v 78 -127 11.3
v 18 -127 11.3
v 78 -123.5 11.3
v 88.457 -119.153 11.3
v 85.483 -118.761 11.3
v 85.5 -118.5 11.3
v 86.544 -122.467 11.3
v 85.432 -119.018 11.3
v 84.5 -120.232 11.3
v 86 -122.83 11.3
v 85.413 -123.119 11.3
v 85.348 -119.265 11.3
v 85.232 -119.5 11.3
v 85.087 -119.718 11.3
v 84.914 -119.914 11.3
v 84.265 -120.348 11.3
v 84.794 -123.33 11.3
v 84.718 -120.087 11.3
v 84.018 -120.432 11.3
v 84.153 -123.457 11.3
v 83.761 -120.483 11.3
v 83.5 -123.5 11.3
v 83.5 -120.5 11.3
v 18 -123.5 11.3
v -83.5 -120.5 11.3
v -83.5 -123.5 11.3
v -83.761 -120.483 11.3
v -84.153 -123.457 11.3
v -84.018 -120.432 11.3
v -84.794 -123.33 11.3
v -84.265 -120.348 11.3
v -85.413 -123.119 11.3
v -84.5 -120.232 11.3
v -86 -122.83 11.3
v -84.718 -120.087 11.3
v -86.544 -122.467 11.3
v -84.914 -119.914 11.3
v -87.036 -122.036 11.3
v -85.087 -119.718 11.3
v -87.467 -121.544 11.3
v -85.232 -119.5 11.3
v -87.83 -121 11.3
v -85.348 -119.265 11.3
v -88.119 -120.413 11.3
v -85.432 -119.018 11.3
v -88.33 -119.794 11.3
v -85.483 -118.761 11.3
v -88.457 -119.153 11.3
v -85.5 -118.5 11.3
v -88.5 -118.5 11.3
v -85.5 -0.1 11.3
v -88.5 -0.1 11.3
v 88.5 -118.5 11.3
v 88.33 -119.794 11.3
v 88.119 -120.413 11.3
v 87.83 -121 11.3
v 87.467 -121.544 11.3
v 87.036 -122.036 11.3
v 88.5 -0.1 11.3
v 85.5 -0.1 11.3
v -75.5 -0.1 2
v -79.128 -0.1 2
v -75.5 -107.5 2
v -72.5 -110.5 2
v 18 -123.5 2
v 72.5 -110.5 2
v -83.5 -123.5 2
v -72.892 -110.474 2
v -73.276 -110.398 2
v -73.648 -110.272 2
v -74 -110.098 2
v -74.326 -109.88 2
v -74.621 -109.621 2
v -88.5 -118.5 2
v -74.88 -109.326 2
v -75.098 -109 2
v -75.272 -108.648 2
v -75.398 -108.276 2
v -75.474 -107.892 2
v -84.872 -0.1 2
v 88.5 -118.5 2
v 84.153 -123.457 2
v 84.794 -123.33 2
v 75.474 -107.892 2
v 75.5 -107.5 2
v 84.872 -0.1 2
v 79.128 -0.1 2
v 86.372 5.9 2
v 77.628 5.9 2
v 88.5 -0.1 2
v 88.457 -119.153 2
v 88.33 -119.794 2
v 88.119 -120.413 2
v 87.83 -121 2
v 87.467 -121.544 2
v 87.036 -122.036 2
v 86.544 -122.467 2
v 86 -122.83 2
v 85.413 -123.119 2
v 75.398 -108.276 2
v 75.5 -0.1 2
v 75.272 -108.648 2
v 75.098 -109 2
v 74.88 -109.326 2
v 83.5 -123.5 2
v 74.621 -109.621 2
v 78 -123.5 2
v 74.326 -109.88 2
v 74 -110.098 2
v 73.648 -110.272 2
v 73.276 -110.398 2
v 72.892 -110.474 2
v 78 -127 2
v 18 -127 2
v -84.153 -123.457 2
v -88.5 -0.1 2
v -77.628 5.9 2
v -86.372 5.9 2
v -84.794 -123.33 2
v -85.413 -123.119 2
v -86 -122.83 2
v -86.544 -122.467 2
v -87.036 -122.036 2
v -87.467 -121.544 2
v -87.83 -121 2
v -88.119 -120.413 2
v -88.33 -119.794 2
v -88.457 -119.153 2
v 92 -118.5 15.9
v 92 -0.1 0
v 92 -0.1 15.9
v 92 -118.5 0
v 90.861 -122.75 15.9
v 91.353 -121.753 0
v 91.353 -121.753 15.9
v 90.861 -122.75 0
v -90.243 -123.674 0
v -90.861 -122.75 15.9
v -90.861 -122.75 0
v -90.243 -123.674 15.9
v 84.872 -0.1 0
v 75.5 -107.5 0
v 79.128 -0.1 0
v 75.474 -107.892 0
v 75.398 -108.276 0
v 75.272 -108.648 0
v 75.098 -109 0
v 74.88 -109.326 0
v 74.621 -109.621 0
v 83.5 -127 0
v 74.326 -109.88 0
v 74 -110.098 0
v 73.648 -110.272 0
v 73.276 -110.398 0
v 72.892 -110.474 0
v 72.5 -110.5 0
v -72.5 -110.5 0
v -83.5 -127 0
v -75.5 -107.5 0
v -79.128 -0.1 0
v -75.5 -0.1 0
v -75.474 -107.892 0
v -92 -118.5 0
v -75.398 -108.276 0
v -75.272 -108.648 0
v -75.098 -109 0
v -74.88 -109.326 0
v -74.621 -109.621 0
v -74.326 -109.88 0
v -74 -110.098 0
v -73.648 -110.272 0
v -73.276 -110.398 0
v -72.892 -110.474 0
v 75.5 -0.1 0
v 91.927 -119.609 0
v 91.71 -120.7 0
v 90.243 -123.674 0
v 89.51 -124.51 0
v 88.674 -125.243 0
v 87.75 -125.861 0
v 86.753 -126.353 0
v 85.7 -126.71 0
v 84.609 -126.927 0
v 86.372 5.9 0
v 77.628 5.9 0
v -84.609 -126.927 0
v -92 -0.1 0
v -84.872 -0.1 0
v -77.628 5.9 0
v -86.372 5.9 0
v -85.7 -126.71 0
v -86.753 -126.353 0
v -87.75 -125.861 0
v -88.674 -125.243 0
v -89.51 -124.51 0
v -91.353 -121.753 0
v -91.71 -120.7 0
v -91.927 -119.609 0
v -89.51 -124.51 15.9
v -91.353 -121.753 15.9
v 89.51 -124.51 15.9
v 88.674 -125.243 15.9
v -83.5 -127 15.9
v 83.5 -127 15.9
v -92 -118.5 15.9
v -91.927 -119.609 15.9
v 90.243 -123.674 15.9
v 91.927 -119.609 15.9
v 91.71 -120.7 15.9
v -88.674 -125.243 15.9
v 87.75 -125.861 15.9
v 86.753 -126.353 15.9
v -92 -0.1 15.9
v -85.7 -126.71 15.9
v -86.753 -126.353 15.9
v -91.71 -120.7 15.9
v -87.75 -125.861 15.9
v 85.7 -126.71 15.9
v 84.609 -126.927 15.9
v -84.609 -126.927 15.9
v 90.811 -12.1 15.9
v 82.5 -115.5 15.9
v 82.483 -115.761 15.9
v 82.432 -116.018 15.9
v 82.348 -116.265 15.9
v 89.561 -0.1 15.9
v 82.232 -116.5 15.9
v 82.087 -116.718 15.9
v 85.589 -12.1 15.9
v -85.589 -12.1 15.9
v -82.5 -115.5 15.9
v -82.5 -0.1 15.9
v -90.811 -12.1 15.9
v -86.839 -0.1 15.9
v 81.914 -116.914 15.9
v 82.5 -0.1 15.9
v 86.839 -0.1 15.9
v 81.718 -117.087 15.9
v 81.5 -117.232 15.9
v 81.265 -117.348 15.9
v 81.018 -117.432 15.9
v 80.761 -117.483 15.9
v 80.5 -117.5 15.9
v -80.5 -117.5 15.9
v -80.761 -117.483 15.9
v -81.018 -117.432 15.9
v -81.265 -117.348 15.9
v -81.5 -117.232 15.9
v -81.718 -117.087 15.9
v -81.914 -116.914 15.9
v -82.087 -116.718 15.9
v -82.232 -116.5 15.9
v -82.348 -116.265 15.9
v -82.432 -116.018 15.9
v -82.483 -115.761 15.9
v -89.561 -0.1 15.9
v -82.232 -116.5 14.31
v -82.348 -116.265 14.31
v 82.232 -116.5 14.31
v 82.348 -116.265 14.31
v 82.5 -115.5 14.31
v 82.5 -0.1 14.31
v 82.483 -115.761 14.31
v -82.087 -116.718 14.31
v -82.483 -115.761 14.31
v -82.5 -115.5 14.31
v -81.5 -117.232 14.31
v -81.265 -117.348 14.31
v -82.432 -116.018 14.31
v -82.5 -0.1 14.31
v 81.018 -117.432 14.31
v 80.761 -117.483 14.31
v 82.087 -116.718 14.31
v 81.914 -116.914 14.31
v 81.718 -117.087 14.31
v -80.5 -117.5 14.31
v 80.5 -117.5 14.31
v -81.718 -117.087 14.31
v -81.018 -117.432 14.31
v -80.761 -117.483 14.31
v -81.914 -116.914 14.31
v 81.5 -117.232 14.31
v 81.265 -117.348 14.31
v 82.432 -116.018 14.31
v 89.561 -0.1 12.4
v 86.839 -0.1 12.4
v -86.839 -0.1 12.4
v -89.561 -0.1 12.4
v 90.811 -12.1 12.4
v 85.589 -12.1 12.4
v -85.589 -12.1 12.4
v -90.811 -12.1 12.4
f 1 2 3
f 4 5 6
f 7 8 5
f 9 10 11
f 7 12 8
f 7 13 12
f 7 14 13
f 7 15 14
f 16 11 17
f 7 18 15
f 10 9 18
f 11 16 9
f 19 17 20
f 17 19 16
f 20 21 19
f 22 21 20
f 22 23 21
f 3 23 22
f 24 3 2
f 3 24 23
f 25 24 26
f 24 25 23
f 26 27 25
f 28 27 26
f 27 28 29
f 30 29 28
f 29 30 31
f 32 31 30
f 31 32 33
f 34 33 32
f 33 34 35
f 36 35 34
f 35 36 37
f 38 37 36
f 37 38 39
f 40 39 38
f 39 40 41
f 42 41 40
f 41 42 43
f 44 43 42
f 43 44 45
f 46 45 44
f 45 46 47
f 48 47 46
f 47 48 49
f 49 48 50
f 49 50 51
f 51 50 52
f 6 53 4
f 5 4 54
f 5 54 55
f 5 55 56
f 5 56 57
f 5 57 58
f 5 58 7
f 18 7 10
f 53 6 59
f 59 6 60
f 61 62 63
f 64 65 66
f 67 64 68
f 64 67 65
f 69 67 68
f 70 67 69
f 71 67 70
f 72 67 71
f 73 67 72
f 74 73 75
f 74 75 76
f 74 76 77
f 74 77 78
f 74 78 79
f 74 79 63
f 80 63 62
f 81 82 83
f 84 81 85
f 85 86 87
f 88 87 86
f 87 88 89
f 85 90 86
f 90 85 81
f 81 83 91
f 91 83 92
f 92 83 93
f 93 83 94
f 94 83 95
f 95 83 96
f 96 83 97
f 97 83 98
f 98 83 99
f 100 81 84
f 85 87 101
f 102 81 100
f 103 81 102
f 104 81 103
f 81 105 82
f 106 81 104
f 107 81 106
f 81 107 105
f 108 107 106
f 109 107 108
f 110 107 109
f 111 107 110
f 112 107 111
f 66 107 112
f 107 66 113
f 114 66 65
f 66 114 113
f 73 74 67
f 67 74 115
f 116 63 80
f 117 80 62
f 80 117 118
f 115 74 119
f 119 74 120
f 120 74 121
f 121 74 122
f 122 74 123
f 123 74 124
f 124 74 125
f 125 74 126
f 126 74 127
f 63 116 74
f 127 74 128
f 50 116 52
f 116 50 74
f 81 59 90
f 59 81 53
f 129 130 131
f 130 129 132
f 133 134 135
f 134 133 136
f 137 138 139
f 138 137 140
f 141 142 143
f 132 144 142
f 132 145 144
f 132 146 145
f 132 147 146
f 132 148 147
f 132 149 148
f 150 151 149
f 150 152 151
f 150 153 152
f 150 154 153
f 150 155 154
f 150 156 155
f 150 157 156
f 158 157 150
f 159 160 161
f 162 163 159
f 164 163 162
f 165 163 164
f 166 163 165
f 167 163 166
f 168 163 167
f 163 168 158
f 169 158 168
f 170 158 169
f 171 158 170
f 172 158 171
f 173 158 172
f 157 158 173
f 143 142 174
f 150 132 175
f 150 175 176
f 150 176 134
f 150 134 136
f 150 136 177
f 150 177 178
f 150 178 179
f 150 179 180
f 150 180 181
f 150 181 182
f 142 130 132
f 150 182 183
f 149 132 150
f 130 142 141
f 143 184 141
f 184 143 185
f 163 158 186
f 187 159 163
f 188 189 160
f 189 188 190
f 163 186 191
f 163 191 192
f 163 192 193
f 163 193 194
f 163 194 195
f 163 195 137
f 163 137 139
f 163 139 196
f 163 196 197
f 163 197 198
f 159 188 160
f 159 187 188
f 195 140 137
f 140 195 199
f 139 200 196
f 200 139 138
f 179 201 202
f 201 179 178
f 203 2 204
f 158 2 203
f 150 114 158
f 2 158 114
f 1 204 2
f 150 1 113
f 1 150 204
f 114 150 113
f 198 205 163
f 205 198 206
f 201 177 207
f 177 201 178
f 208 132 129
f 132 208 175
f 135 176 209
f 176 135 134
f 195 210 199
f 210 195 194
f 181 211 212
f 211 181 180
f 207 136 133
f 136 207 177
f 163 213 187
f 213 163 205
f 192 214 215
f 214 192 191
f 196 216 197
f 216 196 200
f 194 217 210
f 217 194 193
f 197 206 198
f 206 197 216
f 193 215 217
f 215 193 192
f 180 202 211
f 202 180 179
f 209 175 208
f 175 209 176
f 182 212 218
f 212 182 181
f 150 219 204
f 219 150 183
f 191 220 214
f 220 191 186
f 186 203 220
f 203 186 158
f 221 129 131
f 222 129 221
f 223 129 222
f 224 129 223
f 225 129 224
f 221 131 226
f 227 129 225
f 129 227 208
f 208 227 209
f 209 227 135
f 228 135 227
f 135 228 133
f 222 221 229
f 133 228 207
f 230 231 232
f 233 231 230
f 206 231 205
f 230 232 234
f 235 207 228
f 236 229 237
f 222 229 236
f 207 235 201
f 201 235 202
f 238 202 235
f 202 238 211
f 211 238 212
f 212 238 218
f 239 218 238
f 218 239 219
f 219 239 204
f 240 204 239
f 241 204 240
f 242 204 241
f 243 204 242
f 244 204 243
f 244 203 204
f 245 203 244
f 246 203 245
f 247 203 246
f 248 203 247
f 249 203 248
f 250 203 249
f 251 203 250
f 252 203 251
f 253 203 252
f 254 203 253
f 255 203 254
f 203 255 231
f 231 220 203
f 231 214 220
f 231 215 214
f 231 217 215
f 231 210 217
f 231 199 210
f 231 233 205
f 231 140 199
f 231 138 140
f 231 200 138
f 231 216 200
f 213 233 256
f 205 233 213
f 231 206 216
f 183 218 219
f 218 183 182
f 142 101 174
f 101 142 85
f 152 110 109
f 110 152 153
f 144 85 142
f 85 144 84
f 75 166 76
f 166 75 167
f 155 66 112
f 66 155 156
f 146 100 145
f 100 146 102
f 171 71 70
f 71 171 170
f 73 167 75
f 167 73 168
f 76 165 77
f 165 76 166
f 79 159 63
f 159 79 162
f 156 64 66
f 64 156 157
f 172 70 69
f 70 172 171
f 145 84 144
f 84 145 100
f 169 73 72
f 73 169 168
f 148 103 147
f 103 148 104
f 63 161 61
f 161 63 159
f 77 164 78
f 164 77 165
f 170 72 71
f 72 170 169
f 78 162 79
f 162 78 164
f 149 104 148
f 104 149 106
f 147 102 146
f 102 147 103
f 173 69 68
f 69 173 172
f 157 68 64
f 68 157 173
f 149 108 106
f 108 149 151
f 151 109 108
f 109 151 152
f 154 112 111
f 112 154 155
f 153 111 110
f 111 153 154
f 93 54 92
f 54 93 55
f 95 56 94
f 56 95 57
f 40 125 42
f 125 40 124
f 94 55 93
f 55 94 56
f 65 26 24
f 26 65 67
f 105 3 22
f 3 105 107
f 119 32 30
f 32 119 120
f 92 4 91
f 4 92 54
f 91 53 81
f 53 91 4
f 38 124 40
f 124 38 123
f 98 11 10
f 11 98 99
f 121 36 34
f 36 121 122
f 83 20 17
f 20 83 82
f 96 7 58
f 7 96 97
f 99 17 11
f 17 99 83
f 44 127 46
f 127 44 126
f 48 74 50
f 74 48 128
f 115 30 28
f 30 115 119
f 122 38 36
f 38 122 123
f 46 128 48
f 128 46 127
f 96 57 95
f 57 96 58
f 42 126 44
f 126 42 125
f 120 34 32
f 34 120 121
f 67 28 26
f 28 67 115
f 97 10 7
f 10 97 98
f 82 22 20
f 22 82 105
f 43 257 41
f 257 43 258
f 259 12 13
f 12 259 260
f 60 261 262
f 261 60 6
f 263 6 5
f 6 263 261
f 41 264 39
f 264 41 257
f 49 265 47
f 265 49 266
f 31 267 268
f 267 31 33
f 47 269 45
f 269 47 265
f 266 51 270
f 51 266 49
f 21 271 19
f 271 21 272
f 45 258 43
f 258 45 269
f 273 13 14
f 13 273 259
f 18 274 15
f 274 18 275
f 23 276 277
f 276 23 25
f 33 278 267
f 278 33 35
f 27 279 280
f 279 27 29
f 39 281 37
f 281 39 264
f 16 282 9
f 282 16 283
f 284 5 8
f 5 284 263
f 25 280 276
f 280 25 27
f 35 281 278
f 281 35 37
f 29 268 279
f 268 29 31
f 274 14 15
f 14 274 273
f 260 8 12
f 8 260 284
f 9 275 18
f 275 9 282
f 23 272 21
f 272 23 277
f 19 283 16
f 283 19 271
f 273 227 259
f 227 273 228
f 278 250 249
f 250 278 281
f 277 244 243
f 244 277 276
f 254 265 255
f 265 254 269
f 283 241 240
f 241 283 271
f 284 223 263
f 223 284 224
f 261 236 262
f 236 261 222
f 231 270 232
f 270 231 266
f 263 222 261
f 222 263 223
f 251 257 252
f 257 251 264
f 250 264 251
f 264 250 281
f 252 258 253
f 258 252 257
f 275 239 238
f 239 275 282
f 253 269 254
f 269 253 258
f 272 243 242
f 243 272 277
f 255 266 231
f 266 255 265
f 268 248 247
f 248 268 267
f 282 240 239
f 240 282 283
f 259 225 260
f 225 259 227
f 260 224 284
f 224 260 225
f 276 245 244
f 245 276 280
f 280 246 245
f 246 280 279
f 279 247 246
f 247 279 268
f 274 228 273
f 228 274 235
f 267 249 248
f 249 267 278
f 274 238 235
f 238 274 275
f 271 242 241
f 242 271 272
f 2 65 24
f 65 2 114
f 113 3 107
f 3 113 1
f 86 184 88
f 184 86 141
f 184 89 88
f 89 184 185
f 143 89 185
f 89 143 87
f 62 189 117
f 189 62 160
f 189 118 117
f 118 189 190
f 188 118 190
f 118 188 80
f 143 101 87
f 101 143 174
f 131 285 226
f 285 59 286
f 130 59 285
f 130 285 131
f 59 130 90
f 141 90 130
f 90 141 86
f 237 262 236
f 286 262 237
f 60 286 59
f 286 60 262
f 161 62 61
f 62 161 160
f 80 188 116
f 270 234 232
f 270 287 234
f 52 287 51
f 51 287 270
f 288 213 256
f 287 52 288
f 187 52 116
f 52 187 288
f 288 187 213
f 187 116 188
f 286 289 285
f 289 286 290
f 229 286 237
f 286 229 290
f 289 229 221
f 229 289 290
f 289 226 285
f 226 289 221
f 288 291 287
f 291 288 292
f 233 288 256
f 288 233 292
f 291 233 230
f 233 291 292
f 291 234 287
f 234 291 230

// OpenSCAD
// Bottom half of the portrait Surface Go window frame, for a 256 mm bed (Bambu A1/P1/X1).
// Print front face down, no supports. Glue to the other half at the dovetails.
// Dimensions come from ../surface-go-window-frame.scad.
use <../surface-go-window-frame.scad>

frame_portrait_bottom();
